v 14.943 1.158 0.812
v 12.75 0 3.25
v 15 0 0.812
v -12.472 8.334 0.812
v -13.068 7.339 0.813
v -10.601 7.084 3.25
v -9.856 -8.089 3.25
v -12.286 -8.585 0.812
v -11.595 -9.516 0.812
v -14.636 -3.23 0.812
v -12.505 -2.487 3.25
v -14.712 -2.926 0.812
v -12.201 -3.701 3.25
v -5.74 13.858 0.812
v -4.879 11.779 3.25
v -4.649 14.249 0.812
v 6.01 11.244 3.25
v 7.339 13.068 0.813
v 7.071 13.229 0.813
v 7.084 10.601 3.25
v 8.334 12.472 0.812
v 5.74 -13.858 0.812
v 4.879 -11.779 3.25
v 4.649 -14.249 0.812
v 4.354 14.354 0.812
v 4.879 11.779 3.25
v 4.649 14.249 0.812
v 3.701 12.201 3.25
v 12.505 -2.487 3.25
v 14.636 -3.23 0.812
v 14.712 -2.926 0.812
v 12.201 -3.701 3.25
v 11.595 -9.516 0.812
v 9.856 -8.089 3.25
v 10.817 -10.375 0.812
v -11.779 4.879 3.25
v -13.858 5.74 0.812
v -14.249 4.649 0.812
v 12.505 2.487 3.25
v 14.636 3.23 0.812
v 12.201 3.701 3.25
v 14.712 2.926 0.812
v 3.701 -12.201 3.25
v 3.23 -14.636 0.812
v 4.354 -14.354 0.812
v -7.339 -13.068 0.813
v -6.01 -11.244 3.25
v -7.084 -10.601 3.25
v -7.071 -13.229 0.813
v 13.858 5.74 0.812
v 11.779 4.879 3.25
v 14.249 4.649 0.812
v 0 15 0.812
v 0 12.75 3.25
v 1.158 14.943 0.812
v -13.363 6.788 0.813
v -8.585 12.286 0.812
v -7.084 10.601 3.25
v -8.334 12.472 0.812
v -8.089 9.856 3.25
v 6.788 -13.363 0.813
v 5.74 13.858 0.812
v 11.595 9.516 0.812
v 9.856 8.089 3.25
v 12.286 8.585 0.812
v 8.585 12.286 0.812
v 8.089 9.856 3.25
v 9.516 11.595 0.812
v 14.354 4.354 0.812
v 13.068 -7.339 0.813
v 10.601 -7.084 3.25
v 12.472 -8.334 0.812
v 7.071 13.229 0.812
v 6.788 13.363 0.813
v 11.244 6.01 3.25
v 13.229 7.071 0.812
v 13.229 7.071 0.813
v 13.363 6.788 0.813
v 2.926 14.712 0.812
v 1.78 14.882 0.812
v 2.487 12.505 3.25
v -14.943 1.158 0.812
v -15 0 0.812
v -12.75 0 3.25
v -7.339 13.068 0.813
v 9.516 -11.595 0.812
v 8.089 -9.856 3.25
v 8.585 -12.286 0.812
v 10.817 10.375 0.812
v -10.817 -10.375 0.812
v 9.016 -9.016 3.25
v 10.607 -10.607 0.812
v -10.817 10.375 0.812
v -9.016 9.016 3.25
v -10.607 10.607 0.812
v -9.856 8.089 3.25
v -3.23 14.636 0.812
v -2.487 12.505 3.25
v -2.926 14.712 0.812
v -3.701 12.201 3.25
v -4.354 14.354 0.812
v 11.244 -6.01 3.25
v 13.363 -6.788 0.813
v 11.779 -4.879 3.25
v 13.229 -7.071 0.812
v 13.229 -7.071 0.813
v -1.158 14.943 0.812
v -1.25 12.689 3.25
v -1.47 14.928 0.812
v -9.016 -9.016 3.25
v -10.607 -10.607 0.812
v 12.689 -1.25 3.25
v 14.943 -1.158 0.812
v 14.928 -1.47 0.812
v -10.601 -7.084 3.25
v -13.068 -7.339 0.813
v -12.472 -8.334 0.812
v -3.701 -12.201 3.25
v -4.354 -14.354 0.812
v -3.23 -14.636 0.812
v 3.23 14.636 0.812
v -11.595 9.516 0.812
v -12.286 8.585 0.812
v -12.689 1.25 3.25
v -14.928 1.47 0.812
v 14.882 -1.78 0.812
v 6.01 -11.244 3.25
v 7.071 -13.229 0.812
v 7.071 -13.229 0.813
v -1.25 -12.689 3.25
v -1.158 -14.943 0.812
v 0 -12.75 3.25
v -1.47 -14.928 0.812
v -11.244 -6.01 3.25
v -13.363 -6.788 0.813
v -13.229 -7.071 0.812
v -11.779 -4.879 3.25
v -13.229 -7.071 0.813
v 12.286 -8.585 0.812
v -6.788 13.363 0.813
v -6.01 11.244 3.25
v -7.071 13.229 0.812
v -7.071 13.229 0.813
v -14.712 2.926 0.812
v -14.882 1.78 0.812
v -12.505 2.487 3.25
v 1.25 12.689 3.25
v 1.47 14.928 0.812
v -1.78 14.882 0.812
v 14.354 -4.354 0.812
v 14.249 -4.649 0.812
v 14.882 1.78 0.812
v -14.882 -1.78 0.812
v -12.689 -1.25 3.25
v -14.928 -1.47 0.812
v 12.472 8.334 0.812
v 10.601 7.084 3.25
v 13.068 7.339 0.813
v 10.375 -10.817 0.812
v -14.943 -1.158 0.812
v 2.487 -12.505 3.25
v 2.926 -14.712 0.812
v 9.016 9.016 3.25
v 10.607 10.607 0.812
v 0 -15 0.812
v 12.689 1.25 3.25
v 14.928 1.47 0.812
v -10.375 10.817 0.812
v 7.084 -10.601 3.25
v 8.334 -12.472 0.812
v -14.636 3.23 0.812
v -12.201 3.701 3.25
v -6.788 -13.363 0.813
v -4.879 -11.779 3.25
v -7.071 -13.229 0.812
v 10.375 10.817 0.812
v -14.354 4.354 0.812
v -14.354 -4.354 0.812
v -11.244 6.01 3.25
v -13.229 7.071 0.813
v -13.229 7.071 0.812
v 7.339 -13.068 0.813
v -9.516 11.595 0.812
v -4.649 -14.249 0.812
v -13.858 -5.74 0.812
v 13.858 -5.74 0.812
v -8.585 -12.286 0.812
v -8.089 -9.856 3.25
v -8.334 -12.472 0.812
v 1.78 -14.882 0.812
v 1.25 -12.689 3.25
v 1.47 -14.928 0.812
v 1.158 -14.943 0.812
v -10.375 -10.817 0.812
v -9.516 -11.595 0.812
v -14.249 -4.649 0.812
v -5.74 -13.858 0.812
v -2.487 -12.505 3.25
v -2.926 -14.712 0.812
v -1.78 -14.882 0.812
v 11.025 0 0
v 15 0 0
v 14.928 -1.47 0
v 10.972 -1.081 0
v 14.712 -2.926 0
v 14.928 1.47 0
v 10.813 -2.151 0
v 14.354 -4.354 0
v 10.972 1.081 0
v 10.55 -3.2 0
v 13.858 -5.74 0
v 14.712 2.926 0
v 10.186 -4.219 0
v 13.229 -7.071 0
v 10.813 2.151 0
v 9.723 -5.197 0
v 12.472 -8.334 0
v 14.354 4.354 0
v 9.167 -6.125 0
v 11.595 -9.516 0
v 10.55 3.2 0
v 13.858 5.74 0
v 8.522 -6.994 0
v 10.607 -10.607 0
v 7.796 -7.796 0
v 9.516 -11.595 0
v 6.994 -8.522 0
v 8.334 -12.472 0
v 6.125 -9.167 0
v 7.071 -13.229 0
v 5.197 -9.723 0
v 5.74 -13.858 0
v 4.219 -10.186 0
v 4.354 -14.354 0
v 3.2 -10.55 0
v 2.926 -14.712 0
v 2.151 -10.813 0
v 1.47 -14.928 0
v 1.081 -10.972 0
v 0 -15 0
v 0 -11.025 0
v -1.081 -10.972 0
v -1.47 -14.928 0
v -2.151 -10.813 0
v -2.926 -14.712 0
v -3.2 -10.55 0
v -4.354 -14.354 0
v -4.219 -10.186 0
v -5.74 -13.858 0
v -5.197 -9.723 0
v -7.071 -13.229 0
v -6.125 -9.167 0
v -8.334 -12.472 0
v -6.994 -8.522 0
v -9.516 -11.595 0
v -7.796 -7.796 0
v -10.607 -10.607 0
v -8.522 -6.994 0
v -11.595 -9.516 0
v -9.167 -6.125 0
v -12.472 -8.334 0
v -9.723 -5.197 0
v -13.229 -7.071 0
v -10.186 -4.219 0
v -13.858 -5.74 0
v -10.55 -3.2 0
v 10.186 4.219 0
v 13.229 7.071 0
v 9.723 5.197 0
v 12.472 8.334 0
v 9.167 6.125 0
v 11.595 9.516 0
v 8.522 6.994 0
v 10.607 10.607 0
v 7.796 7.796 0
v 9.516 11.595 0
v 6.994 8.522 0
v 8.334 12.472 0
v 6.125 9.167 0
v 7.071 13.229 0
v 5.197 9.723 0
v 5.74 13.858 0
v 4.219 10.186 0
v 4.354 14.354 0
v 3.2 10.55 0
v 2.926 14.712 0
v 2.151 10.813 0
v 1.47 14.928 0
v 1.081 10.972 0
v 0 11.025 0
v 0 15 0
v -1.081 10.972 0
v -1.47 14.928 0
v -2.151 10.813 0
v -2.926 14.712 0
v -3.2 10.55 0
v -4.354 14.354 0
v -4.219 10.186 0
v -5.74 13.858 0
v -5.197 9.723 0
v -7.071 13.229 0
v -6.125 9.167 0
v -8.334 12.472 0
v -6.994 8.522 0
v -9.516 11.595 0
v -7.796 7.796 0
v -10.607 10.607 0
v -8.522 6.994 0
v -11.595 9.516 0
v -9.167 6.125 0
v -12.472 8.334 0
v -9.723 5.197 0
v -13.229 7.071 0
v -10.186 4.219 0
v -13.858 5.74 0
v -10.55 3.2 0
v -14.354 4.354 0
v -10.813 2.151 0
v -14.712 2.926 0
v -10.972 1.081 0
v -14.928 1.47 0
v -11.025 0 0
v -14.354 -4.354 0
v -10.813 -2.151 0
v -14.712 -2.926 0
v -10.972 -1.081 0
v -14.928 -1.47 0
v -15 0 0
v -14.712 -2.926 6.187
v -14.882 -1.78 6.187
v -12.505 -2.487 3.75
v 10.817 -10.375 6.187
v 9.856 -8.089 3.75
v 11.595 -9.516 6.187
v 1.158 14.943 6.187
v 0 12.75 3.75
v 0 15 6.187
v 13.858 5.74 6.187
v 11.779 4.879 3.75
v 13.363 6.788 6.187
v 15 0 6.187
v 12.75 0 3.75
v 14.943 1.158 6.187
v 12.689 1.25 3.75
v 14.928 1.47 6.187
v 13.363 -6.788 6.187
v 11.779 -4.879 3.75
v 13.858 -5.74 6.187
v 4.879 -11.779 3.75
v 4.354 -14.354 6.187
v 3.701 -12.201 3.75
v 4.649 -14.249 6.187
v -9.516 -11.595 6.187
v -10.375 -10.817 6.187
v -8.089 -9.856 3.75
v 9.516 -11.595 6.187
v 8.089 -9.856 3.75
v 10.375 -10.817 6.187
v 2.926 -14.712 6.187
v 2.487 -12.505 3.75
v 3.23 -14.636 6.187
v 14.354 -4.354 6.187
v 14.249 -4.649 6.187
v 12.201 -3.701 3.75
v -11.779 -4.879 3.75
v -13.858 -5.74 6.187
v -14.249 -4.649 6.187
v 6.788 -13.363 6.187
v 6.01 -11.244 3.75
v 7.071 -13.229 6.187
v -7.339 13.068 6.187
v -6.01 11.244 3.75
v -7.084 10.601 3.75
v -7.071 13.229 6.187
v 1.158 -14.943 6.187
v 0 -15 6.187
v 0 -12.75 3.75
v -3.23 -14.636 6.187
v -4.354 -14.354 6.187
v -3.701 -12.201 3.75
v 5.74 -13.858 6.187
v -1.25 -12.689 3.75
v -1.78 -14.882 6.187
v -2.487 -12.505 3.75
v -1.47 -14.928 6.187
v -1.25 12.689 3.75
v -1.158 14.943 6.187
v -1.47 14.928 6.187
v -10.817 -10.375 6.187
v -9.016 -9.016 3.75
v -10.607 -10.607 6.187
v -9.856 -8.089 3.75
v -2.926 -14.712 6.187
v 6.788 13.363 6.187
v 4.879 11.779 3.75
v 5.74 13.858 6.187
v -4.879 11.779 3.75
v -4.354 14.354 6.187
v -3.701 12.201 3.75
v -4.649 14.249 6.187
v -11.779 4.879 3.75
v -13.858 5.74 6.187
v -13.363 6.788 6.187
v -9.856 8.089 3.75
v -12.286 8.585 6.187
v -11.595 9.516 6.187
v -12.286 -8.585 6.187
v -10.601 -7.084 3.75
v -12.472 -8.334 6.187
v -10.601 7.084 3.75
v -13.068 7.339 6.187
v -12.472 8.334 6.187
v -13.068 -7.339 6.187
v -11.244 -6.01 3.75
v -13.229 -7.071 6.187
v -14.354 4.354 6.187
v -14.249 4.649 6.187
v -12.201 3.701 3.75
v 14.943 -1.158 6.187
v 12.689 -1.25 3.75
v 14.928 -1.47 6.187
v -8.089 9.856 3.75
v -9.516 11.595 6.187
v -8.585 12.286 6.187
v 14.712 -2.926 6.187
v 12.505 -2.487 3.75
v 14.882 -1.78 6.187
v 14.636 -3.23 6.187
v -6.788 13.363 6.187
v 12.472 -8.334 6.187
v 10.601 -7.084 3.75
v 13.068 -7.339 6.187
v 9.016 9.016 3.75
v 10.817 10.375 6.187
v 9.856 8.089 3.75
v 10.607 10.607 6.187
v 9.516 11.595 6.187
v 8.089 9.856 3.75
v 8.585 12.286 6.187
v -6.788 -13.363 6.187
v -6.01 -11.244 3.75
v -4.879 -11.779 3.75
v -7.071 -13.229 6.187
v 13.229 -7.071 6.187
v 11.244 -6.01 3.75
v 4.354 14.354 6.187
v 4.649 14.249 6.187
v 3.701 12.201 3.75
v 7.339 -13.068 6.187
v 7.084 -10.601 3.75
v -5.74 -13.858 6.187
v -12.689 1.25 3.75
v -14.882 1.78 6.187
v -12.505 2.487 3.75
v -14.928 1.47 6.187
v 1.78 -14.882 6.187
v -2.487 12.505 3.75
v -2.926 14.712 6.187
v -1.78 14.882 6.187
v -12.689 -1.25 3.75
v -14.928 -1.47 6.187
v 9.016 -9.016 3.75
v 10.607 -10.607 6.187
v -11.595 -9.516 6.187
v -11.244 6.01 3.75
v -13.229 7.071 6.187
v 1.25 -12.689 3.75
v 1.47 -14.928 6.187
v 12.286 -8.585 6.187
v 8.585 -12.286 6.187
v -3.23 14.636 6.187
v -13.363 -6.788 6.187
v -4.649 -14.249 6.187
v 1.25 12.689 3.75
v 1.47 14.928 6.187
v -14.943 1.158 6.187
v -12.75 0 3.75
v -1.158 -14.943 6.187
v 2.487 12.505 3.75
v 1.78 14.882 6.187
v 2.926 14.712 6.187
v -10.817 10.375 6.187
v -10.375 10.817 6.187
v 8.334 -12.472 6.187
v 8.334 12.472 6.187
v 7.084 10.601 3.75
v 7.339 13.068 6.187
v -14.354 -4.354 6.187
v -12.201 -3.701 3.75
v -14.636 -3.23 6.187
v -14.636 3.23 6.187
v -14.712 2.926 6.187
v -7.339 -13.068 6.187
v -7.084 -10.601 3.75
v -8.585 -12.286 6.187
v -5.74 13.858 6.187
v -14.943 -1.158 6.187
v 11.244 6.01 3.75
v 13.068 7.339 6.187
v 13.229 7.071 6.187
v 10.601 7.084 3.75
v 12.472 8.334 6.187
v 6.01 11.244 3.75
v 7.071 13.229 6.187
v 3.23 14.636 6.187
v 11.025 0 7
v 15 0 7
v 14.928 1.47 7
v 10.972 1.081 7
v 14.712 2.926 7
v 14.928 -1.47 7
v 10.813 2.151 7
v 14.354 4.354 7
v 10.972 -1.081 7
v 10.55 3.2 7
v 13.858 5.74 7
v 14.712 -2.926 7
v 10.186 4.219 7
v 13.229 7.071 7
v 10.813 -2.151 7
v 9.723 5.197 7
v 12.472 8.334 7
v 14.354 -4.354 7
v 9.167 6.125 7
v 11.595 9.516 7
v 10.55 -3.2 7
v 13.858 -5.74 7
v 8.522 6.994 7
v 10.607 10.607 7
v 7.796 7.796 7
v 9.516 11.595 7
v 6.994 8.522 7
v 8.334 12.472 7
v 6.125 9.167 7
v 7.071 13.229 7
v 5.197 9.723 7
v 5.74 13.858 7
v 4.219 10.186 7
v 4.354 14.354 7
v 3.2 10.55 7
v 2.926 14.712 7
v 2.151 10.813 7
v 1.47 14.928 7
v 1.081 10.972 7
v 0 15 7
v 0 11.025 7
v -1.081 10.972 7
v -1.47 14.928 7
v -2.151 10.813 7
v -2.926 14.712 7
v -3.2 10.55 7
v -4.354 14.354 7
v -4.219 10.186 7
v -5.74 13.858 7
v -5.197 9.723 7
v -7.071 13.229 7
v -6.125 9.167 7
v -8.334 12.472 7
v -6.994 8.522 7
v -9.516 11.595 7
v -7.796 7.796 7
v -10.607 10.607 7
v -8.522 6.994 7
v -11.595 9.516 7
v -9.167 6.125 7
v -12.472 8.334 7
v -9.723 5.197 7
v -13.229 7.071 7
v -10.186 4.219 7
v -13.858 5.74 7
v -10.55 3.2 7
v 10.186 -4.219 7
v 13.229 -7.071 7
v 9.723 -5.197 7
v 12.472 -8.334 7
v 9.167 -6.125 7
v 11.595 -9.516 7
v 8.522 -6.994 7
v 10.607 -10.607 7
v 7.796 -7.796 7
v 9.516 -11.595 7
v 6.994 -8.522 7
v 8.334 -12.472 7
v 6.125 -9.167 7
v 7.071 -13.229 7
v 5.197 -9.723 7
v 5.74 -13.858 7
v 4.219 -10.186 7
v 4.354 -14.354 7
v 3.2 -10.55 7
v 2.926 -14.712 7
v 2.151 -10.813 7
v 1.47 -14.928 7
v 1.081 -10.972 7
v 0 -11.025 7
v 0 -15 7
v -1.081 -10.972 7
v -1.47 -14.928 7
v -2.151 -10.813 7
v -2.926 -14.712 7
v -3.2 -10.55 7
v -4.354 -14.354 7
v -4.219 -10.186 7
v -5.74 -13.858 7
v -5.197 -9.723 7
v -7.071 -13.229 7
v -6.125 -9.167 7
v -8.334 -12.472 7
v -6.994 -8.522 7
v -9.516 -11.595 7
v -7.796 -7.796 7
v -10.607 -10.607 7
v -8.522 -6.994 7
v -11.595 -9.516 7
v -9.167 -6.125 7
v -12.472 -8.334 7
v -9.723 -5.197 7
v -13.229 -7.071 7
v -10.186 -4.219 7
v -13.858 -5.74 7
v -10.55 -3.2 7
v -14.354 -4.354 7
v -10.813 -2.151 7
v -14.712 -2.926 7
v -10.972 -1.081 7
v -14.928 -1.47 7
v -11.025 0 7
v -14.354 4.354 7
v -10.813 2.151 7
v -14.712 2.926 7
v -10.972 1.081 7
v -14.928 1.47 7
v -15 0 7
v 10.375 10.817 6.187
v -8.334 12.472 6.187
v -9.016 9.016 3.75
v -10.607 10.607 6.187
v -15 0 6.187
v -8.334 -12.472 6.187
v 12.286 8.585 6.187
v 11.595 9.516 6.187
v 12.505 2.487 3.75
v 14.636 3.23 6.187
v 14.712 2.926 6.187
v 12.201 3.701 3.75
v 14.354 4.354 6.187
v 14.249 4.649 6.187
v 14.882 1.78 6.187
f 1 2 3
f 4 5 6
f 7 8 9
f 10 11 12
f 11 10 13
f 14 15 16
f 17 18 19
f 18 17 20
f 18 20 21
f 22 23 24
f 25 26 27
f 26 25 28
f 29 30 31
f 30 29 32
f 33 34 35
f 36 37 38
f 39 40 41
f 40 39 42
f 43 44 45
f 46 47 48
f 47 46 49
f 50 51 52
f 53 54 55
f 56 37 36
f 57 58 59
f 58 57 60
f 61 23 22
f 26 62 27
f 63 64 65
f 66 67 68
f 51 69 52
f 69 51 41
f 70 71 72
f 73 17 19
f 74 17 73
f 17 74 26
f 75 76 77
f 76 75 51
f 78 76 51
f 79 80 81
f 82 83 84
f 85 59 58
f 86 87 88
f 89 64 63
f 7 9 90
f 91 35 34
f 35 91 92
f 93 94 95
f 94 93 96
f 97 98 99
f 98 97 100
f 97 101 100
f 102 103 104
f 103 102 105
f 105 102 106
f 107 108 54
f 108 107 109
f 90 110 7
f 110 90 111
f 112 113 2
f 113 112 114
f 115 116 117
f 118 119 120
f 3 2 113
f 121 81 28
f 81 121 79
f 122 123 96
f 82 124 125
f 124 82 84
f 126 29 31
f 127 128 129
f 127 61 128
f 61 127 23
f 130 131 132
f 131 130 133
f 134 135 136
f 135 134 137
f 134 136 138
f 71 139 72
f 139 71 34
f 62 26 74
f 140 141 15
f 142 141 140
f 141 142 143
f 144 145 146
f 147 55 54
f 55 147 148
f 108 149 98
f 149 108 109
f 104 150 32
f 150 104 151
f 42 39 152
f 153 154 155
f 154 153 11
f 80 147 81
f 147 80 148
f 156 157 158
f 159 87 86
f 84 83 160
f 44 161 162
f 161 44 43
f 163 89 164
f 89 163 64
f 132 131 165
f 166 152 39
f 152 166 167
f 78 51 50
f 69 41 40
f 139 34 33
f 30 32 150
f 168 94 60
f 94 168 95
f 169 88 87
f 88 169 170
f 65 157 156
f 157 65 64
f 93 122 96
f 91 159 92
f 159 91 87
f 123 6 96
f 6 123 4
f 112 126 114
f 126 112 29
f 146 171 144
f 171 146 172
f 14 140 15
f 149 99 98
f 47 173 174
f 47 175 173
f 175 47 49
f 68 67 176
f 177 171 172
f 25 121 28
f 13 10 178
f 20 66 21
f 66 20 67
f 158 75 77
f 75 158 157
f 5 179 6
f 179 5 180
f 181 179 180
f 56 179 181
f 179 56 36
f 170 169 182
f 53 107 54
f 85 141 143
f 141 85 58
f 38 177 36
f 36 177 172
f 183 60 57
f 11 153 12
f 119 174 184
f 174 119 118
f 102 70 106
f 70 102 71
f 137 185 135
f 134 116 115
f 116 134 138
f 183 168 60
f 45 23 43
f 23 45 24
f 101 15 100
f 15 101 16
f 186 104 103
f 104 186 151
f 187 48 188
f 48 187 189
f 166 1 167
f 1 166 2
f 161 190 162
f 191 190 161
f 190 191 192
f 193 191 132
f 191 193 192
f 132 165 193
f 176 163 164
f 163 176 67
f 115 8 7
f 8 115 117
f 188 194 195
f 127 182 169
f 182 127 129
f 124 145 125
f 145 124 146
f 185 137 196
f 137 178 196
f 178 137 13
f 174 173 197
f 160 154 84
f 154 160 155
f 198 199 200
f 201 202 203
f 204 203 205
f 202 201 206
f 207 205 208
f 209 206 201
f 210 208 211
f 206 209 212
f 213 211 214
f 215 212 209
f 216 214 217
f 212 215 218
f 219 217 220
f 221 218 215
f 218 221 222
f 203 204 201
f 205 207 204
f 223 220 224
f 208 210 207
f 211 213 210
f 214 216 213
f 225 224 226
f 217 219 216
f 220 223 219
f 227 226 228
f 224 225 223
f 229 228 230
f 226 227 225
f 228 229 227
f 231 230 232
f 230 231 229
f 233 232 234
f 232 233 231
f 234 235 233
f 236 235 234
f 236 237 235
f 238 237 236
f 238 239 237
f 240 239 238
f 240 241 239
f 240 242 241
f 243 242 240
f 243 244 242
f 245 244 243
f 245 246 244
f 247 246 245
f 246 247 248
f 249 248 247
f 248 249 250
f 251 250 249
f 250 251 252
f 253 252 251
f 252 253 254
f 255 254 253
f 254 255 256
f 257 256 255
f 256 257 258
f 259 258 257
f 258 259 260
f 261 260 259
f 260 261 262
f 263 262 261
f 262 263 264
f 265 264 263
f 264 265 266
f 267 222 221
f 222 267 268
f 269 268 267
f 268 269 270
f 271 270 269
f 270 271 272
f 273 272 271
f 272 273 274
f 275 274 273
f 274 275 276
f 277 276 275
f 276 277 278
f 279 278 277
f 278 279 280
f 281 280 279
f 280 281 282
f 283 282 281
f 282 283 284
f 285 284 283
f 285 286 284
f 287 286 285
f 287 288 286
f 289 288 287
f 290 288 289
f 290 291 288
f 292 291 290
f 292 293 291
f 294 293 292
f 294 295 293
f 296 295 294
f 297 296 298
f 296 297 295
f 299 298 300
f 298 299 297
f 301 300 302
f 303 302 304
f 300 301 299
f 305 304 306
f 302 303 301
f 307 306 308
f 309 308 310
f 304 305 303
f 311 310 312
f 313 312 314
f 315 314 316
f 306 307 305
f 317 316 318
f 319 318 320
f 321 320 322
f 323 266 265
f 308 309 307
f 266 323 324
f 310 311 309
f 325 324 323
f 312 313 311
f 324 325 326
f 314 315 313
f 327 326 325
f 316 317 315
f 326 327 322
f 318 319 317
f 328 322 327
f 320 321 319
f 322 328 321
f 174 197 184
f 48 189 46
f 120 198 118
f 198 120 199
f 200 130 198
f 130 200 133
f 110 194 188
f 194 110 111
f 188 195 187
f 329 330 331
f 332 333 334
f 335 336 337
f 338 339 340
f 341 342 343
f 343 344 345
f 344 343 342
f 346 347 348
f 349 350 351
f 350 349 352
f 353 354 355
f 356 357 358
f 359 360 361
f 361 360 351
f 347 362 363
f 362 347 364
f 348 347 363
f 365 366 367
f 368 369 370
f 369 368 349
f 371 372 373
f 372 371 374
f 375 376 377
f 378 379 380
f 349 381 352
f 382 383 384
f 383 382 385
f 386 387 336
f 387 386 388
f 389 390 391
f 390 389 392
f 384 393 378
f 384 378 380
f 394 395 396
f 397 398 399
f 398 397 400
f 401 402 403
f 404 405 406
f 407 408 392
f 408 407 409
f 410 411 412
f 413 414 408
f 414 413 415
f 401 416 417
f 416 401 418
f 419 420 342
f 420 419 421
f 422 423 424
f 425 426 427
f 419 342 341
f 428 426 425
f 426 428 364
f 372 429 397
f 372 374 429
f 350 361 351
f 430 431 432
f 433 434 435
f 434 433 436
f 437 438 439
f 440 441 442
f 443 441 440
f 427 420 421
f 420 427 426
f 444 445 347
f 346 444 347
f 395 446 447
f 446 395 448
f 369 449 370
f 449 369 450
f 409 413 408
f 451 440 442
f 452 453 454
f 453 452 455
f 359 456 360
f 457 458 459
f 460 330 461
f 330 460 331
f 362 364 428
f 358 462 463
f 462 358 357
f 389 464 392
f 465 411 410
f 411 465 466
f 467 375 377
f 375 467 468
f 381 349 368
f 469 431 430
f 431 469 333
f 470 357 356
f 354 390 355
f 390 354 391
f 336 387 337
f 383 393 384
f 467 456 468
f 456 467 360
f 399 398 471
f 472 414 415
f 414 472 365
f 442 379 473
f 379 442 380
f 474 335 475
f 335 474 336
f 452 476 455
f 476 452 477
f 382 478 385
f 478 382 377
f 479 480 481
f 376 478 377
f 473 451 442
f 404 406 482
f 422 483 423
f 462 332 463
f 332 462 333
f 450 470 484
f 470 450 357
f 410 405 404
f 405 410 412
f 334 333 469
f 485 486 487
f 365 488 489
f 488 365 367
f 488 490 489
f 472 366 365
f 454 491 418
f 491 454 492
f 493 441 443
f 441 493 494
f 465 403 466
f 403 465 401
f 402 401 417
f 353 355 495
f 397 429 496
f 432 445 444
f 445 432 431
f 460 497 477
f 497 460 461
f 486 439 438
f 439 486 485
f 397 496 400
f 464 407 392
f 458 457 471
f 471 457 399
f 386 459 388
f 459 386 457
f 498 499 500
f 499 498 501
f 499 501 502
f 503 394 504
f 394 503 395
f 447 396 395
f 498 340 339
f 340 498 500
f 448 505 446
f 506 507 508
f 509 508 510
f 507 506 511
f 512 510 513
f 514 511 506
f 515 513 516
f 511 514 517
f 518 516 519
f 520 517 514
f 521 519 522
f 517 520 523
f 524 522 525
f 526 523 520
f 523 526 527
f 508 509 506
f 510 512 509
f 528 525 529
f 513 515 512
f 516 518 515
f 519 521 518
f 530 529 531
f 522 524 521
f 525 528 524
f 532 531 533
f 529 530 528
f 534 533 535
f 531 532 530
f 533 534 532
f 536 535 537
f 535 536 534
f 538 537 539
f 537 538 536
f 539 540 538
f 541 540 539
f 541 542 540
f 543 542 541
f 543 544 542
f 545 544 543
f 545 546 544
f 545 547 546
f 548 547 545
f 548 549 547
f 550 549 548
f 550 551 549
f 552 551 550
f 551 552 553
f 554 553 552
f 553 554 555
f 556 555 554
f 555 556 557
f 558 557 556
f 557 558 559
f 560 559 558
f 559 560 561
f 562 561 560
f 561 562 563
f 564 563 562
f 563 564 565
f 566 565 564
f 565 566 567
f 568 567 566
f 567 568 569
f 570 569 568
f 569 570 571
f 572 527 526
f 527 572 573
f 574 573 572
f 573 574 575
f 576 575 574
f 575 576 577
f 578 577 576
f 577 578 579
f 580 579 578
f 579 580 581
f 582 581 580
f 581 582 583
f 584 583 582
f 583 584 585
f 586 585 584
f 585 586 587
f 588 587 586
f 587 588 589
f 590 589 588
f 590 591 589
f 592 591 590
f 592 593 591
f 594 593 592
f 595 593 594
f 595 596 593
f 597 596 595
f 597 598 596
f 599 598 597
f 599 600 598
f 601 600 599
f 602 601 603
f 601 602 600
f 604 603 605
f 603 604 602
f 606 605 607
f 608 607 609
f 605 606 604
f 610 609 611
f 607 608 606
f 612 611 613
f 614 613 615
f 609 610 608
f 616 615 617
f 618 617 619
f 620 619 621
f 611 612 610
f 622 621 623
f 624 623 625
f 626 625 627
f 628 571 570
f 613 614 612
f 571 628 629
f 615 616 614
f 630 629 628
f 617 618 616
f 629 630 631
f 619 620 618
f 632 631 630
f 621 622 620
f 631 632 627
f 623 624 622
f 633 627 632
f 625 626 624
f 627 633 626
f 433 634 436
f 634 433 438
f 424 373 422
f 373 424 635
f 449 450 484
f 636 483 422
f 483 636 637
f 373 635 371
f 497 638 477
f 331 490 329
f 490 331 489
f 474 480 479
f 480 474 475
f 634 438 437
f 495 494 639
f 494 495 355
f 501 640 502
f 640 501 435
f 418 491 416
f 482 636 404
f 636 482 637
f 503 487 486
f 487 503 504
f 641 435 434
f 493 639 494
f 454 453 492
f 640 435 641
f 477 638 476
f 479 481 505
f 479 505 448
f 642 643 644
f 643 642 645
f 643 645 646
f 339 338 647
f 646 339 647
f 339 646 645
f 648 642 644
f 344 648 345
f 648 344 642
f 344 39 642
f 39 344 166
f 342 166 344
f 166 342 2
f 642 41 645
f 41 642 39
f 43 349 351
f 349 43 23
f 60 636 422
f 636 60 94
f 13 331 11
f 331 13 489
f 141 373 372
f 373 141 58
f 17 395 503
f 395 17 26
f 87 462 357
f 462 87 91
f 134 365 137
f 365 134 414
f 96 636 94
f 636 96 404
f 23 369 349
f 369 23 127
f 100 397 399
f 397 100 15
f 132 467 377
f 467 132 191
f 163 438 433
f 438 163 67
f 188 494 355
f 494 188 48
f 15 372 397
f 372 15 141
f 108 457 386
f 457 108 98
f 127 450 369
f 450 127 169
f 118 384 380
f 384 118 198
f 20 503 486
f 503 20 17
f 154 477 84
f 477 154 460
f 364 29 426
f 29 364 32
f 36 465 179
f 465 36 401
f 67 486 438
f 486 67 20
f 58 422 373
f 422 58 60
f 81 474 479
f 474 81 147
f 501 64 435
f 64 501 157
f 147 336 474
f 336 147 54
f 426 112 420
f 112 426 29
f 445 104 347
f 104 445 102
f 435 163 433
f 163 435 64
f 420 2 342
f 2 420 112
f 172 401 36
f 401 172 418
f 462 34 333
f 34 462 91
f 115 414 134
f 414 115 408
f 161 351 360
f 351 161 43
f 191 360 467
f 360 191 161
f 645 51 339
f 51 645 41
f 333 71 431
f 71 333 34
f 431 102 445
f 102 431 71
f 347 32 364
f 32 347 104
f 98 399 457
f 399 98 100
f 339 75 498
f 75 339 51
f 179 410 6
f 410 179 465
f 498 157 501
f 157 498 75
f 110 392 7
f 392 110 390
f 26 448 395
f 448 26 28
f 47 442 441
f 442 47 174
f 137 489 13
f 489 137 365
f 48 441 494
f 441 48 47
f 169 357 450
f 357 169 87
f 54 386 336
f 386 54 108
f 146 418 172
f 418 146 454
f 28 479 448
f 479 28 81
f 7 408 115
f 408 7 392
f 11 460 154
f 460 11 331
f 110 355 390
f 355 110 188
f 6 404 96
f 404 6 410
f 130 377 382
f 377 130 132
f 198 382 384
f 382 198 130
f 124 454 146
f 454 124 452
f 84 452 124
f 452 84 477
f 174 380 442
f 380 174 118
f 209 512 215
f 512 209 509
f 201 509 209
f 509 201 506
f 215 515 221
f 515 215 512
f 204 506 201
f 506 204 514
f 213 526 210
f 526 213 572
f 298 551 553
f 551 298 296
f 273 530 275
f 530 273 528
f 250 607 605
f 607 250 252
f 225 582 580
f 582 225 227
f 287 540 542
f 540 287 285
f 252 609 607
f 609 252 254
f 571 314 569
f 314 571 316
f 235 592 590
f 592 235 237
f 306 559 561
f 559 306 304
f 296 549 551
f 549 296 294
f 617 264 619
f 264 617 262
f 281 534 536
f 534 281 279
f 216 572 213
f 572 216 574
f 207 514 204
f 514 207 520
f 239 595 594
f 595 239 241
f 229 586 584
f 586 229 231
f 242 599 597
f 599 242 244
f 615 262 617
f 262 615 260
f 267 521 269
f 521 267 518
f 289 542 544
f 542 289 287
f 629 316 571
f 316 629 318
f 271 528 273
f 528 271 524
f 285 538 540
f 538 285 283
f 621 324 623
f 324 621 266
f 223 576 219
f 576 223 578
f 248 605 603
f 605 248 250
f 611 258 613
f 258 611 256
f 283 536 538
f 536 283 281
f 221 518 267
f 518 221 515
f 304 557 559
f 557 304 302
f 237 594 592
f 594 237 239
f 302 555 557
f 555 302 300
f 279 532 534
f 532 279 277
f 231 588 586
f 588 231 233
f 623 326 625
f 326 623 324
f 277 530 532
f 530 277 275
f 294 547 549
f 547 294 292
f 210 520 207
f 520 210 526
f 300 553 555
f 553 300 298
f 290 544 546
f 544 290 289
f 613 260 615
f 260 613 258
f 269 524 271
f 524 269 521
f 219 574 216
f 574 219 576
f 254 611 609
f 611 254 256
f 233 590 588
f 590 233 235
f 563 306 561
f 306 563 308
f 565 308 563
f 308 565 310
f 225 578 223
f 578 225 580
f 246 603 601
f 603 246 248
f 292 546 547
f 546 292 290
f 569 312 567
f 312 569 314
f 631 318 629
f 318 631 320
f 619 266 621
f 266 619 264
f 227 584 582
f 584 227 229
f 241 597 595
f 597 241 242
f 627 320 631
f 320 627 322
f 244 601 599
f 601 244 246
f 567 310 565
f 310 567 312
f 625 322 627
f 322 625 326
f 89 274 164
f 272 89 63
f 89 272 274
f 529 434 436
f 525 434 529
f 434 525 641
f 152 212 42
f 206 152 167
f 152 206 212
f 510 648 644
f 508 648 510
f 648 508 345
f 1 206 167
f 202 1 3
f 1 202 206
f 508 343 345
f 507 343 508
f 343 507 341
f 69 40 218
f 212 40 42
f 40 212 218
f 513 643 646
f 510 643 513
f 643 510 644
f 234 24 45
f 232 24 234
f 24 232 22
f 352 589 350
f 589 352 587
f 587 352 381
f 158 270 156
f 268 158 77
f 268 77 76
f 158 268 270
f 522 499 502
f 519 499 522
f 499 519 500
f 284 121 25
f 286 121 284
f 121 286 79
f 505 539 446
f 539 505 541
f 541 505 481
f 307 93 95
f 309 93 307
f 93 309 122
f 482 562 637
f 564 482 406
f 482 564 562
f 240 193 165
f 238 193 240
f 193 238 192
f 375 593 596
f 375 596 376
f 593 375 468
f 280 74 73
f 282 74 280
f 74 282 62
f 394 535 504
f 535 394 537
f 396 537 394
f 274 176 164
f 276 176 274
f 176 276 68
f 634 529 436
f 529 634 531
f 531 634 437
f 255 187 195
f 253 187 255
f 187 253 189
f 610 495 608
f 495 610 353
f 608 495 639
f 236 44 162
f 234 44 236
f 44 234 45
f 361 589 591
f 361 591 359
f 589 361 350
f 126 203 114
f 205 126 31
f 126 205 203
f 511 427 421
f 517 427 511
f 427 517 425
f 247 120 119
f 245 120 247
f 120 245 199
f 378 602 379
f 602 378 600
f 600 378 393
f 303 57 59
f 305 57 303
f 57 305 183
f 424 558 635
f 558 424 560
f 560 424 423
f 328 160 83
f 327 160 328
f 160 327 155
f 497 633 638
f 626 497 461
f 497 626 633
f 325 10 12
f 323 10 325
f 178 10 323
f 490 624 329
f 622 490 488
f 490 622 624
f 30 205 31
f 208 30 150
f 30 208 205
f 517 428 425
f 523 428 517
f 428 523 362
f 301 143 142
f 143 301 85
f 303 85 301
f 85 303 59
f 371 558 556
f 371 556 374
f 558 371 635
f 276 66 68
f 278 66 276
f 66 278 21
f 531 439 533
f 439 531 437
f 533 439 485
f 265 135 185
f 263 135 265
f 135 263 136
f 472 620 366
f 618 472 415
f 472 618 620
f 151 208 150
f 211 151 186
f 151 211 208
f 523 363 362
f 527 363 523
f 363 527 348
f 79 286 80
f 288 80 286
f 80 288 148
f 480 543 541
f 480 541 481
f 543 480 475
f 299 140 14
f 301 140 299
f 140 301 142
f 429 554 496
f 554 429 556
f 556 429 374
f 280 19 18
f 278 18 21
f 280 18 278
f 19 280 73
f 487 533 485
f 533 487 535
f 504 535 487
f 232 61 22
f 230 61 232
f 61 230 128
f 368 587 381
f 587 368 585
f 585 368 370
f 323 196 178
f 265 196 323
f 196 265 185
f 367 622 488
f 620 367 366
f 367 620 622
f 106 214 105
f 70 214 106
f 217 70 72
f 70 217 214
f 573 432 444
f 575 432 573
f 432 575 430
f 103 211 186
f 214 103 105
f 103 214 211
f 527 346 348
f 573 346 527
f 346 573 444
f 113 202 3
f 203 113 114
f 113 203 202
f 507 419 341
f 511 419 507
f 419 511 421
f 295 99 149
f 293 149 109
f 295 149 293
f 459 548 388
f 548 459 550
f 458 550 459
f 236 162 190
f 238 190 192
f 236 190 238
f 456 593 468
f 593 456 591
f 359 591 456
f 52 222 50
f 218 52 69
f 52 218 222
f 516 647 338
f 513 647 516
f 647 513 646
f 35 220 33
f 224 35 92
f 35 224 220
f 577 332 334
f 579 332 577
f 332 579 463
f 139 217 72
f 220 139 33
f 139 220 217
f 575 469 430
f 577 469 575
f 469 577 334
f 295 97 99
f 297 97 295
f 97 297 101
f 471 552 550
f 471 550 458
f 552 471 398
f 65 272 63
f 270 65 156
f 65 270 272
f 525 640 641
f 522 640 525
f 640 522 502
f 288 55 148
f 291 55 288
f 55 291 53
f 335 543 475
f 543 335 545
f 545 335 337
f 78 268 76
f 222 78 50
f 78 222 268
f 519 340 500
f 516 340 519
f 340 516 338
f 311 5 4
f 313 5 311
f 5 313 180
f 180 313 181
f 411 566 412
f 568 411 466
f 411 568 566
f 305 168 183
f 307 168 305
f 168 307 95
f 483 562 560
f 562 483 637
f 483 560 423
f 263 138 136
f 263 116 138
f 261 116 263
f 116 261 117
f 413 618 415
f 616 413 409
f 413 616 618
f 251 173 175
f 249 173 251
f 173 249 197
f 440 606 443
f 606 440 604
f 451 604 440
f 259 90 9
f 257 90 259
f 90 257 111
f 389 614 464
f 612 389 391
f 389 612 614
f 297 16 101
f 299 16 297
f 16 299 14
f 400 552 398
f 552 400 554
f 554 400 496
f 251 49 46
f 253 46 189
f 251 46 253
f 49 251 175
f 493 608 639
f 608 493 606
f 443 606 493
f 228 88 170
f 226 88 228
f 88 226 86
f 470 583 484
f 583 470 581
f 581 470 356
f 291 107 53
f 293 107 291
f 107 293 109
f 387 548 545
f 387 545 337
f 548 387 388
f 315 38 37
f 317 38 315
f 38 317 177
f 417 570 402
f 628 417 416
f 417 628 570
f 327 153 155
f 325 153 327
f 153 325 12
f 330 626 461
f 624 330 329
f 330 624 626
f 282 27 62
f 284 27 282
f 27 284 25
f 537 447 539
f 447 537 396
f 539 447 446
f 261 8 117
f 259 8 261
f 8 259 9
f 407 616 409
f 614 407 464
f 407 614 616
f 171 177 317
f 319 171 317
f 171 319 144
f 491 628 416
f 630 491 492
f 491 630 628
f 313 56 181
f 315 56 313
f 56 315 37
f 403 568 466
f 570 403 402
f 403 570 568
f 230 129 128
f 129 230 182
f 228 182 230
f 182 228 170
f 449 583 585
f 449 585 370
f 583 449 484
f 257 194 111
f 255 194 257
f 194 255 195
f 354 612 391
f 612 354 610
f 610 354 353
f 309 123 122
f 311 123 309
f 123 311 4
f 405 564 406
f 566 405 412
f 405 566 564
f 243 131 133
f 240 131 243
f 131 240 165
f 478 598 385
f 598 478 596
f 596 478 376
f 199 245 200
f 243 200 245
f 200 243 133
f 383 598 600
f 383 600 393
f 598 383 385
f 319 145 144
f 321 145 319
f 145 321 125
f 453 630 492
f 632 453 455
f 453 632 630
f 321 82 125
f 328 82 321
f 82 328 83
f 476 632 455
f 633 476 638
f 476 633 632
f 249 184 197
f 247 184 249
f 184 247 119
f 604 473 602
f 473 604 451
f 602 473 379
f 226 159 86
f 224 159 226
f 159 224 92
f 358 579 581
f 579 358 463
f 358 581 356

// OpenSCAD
//Segments in the circles (Higher numbers produce smoother curve, but take longer to render)
segments = 64;
//Thickness of bearing
w = 7;
//Outer Diameter of roller
outer_d   = 30;
//Diameter of V-Trough
inner_d   = 25.5;
//Diameter of bearing
bearing_d = 22.05;
// Width of center flat part
center_flat_w = 0.5;
//Amount to cut off flanges to produce flat circumference (0 - 2 works well at default diameters)
cut = 0.75; // [0:0.01:10]


difference(){
    difference(){
        union(){
            cylinder(h=w/2-center_flat_w/2, r1=outer_d/2+cut, r2=inner_d/2, $fn=segments);
            translate([0,0,w/2-0.0001+center_flat_w/2])
            cylinder(h=w/2-center_flat_w/2, r1=inner_d/2, r2=outer_d/2+cut, $fn=segments);
            translate([0,0,w/2-0.001-center_flat_w/2])
            cylinder(h=center_flat_w+0.1,r=inner_d/2, $fn=segments);
        }
        translate([0,0,-1])
        cylinder(h=w+2, r1=bearing_d/2, r2=bearing_d/2, $fn=segments);
    }
    difference(){
        
        cube(outer_d+5+cut*2, center=true);
        translate([0,0,-1])
        cylinder(h=w+2, r1=outer_d/2, r2=outer_d/2, $fn=segments);
    }
}
